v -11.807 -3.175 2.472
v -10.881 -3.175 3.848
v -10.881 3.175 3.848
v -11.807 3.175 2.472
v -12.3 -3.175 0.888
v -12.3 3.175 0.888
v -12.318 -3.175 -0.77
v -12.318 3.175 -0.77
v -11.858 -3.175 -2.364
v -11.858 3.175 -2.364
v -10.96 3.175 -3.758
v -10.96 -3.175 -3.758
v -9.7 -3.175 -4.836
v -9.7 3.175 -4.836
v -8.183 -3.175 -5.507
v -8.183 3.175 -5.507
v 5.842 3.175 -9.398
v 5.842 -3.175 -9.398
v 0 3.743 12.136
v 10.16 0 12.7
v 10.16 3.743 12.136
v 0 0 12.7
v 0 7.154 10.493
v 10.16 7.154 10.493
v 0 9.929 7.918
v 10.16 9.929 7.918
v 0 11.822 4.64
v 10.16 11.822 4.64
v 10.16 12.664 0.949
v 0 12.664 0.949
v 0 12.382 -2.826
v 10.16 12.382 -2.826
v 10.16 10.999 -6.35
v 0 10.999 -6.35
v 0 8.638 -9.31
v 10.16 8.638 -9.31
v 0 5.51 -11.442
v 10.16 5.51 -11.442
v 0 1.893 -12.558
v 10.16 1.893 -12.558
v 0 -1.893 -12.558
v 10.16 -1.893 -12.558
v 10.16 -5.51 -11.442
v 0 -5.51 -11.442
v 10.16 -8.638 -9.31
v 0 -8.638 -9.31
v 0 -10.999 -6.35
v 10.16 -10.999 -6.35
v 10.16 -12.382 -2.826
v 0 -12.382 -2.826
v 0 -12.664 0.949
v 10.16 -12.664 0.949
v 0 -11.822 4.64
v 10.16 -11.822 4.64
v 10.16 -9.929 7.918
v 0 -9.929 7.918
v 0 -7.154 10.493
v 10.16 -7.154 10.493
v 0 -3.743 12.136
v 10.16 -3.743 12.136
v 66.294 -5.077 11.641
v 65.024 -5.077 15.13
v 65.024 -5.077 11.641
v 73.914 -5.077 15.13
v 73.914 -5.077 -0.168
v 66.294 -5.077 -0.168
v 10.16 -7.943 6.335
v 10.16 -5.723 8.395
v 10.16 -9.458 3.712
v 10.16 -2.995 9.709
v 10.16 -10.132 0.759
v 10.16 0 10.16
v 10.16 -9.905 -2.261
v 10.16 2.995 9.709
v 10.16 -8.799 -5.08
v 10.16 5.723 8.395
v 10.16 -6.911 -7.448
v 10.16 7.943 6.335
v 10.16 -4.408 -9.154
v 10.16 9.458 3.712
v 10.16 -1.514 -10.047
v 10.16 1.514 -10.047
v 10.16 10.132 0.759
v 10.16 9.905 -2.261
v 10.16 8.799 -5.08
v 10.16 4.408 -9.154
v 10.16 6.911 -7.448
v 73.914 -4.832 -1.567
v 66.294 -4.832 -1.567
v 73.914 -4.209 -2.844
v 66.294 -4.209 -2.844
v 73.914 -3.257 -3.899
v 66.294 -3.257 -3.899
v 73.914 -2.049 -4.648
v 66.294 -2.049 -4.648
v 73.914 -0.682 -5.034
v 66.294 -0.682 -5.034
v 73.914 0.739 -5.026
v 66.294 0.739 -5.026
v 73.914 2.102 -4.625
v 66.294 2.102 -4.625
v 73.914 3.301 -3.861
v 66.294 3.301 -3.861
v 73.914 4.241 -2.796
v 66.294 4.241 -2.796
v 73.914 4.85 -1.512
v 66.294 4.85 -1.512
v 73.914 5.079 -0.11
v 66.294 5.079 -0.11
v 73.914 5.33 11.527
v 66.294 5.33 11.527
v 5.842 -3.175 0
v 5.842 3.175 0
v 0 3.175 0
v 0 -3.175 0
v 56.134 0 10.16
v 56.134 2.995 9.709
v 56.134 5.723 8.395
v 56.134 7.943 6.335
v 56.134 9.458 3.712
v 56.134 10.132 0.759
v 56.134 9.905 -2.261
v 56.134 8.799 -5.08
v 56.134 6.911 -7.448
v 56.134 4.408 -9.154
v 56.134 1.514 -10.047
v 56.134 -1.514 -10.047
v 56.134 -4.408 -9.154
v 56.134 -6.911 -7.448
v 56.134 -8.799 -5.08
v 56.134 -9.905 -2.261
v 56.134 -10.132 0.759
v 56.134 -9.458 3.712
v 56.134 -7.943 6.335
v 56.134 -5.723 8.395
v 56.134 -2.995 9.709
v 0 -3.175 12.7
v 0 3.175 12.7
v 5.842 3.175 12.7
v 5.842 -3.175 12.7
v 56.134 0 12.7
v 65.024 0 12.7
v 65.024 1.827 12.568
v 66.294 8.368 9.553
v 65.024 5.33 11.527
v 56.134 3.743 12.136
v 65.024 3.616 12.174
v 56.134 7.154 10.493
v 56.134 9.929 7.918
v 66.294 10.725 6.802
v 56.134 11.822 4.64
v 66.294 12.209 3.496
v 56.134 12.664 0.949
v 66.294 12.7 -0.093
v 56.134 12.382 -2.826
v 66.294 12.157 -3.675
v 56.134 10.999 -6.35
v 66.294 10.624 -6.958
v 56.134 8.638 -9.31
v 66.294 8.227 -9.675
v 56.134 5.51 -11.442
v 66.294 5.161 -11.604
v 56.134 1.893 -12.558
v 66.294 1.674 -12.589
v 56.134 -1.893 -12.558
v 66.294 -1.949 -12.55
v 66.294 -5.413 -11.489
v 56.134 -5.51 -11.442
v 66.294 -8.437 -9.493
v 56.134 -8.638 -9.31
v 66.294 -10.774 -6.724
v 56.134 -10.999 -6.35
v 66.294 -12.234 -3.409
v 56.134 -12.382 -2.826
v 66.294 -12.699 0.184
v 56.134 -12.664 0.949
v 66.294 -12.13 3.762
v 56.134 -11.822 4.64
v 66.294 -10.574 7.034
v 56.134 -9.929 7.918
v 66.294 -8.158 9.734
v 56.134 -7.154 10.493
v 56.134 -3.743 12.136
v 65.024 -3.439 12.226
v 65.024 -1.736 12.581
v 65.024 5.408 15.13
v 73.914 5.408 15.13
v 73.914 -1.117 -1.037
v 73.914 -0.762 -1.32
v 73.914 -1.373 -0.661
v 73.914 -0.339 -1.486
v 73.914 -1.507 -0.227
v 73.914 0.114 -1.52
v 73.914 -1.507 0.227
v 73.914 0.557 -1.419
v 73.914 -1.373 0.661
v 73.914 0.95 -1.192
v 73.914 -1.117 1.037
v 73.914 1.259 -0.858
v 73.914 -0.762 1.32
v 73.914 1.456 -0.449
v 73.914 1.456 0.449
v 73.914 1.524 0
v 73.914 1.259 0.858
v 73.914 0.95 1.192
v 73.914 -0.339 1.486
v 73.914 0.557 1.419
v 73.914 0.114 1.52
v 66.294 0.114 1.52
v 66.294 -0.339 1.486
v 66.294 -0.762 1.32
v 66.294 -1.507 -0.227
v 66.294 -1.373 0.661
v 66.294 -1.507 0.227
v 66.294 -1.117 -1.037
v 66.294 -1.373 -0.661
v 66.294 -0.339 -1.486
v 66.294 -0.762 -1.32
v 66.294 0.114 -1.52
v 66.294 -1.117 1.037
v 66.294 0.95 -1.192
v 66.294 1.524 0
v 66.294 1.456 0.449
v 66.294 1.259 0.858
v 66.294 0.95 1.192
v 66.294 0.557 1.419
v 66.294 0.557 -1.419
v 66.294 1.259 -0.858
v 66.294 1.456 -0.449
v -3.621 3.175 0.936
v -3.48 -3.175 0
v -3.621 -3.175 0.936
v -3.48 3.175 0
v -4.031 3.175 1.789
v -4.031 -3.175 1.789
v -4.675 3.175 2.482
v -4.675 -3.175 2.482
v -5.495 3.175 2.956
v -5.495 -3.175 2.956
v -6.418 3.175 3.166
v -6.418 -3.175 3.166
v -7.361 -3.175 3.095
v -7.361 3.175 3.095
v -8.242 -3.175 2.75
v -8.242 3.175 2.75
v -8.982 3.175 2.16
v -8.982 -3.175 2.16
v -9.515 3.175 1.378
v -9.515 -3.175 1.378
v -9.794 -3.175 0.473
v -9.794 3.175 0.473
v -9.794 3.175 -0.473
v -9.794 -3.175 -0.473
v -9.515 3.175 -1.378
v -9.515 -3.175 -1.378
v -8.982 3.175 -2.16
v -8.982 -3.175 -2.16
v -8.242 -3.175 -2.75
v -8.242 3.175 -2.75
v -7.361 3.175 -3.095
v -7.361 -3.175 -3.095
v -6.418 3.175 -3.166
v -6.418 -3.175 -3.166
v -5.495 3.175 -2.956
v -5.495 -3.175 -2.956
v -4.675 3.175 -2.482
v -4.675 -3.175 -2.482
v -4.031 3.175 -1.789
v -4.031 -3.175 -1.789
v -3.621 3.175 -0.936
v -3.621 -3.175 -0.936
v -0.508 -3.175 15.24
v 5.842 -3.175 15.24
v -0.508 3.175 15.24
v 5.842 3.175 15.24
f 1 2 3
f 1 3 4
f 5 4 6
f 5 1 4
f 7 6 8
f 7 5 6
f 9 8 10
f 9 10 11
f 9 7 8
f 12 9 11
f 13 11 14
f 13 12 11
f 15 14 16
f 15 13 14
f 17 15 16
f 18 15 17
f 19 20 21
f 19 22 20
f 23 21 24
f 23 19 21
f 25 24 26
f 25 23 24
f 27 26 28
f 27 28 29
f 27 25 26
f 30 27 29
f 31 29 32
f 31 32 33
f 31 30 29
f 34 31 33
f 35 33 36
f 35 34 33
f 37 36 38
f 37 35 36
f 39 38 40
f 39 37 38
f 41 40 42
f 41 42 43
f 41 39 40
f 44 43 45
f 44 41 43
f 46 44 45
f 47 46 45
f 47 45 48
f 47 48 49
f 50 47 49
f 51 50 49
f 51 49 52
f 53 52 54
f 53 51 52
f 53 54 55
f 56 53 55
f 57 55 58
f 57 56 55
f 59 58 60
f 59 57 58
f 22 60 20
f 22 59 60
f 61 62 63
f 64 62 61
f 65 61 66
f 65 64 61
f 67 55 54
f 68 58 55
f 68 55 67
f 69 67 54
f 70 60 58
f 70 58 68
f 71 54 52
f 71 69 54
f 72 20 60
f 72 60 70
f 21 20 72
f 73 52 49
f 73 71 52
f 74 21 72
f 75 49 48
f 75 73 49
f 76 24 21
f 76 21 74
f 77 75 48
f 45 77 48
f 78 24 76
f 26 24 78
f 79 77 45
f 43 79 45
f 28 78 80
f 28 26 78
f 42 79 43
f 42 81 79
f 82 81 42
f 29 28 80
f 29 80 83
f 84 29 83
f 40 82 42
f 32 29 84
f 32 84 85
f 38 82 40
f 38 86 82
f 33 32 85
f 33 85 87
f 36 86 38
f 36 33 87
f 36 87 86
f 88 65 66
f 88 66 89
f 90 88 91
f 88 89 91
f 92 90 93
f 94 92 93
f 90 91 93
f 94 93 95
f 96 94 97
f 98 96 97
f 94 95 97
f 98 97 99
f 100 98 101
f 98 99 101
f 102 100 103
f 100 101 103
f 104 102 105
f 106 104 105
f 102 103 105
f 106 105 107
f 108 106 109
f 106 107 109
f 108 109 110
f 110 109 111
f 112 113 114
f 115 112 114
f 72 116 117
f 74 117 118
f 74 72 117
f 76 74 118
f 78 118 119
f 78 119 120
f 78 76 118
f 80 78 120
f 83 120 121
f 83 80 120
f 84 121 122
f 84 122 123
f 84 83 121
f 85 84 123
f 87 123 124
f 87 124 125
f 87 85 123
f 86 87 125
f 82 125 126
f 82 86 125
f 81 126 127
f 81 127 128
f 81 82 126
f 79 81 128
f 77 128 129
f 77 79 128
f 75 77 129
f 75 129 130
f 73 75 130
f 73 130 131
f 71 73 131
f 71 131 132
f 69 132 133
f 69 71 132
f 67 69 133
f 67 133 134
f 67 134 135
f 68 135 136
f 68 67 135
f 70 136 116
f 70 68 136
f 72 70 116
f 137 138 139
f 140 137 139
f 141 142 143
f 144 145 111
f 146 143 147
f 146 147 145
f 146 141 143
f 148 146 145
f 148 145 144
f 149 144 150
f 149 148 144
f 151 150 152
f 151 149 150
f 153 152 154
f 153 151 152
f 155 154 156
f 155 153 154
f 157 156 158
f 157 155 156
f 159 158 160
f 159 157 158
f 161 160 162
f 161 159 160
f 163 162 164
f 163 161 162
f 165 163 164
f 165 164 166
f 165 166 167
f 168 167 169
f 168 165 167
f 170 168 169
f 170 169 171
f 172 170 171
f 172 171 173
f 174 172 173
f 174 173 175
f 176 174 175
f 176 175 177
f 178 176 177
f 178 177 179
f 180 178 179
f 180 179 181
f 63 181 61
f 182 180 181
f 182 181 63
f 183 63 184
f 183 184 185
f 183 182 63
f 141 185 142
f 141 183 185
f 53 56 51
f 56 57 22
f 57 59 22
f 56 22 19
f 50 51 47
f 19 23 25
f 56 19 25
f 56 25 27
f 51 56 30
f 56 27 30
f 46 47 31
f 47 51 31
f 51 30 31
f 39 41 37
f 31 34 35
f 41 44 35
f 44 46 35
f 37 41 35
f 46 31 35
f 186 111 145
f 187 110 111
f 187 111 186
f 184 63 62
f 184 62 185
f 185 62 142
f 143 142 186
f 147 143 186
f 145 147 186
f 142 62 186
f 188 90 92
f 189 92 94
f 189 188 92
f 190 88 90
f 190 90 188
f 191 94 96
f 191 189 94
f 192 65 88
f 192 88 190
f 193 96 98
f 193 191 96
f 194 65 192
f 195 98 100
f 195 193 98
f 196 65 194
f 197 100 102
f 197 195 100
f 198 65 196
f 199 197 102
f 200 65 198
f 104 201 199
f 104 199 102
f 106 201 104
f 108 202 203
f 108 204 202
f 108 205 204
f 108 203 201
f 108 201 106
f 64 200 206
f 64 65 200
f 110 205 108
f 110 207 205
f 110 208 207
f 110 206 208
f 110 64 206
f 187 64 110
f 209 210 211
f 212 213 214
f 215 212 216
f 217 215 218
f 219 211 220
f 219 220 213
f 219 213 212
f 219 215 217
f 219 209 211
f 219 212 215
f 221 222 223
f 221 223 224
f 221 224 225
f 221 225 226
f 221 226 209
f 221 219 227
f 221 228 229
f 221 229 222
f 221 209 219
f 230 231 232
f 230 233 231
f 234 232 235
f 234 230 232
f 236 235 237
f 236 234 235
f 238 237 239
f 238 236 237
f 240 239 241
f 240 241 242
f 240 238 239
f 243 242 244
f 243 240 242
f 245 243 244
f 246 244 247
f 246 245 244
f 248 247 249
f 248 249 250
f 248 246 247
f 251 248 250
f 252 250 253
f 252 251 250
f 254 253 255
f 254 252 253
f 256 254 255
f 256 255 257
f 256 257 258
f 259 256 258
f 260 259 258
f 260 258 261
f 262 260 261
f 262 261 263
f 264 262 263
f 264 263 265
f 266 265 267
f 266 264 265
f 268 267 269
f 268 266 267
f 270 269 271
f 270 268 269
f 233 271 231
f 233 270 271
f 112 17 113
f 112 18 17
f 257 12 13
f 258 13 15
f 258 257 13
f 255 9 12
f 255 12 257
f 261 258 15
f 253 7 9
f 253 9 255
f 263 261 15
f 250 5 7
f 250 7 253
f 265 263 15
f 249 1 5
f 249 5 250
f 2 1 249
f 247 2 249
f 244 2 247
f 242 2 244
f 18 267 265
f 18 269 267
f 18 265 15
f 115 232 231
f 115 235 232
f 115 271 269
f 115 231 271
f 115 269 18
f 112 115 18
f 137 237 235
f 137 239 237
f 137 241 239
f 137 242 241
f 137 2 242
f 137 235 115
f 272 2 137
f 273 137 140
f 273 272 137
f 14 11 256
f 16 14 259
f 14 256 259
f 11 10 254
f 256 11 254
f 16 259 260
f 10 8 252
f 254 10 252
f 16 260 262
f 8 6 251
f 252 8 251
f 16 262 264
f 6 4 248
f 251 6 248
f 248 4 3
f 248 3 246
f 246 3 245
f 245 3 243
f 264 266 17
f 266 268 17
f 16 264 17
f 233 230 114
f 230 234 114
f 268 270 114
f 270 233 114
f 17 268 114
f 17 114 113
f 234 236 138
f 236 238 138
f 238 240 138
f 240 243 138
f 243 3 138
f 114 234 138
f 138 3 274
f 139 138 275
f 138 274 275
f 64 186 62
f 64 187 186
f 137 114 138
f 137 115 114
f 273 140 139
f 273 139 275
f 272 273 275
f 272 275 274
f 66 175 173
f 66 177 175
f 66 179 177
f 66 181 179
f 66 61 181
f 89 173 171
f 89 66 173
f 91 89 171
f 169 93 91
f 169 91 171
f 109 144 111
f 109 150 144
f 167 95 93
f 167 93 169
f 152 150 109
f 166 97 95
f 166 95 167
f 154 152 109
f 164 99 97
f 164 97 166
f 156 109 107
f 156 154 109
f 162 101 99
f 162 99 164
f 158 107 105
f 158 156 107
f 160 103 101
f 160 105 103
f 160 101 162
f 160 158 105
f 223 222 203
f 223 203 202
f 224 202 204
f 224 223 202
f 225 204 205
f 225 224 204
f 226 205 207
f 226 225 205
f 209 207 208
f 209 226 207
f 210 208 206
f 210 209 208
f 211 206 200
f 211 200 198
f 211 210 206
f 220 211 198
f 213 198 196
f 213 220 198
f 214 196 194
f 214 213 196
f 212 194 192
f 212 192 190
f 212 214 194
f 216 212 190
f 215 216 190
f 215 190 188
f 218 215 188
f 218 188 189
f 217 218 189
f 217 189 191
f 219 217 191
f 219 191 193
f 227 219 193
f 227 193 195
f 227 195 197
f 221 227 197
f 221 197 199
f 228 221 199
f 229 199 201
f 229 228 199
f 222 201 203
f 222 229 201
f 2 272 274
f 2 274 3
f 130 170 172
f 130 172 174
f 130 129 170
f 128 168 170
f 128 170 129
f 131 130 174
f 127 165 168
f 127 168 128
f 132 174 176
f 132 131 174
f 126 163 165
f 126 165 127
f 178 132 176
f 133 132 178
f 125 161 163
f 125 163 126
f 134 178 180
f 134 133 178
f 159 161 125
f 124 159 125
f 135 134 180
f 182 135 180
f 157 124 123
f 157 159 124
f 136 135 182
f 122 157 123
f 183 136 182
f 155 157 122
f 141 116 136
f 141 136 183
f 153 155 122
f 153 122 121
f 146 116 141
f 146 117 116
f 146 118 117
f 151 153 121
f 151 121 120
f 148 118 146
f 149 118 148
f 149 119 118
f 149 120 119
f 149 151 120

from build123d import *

# Parameters (mm, degrees)
F0_W          = 5.842
F0_H          = 12.7
F0_R          = 3.175
F2_DEPTH      = 3.175
F3_R          = 1.524
F4_DEPTH      = 7.62
F4_DEPTH_BACK = 1.27


with BuildPart() as f1:
    # F0 (on Front) → F1 (revolve)
    with BuildSketch(Plane.XZ):
        with Locations((2.921, 6.35)):
            Rectangle(F0_W, F0_H)
        Polygon((5.842, 12.7), (5.842, 0), (66.294, 0), (66.294, 12.7), (56.134, 12.7), (56.134, 10.16), (10.16, 10.16), (10.16, 12.7), align=None)
    revolve(axis=Axis((33.147, 0, 0), (-1, 0, 0)))

    # F3 (on face) → F4 (join, two sides)
    with BuildSketch(Plane.YZ.offset(66.294)) as f4_sk:
        with BuildLine():
            Line((-5.0772309735, 0.1677070124), (-5.0772309735, -0.1677070124))
            ThreePointArc((-5.0772309735, -0.1677070124), (0.0289763613, -5.0799173586), (5.0788137641, -0.1097759081))
            ThreePointArc((5.0788137641, -0.1097759081), (5.0797034324, -0.0548911586), (5.08, 0))
            ThreePointArc((5.08, 0), (0.0838649353, 5.0793076962), (-5.0772309735, 0.1677070124))
        make_face()
        Circle(F3_R, mode=Mode.SUBTRACT)
        with BuildLine():
            ThreePointArc((5.08, 0), (5.0797034324, -0.0548911586), (5.0788137641, -0.1097759081))
            Line((5.0788137641, -0.1097759081), (5.3303419683, 11.5272483491))
            ThreePointArc((5.3303419683, 11.5272483491), (0.1387383567, 12.6992421691), (-5.0772309735, 11.6409503754))
            Line((-5.0772309735, 11.6409503754), (-5.0772309735, 0.1677070124))
            ThreePointArc((-5.0772309735, 0.1677070124), (0.0838649353, 5.0793076962), (5.08, 0))
        make_face()
        with BuildLine():
            ThreePointArc((-5.0772309735, 11.6409503754), (0.1387383567, 12.6992421691), (5.3303419683, 11.5272483491))
            Line((5.3303419683, 11.5272483491), (5.408218408, 15.1302240919))
            Line((5.408218408, 15.1302240919), (-5.0772309735, 15.1302240919))
            Line((-5.0772309735, 15.1302240919), (-5.0772309735, 11.6409503754))
        make_face()
    extrude(amount=F4_DEPTH)
    extrude(f4_sk.sketch, amount=-F4_DEPTH_BACK)


with BuildPart() as f2:
    # F0 (on Front) → F2 (new body, symmetric)
    with BuildSketch(Plane.XZ):
        with BuildLine():
            Line((-0.9398, 0), (0, 0))
            Line((0, 0), (0, 12.7))
            Line((0, 12.7), (5.842, 12.7))
            Line((5.842, 12.7), (5.842, 15.24))
            Line((5.842, 15.24), (-0.508, 15.24))
            Line((-0.508, 15.24), (-10.8806298187, 3.8475430269))
            ThreePointArc((-10.8806298187, 3.8475430269), (-4.5919612295, 5.3297205562), (-0.9398, 0))
        make_face()
        with BuildLine():
            ThreePointArc((-8.1826630726, -5.5069827884), (-3.1957909266, -4.5493385486), (-0.9398, 0))
            ThreePointArc((-0.9398, 0), (-4.5919612295, 5.3297205562), (-10.8806298187, 3.8475430269))
            ThreePointArc((-10.8806298187, 3.8475430269), (-12.1459778134, -1.5837270034), (-8.1826630726, -5.5069827884))
        make_face()
        with Locations((-6.6548, 0)):
            Circle(F0_R, mode=Mode.SUBTRACT)
        with BuildLine():
            Line((5.842, 0), (0, 0))
            Line((0, 0), (-0.9398, 0))
            ThreePointArc((-0.9398, 0), (-3.1957909266, -4.5493385486), (-8.1826630726, -5.5069827884))
            Line((-8.1826630726, -5.5069827884), (5.842, -9.398))
            Line((5.842, -9.398), (5.842, 0))
        make_face()
    extrude(amount=F2_DEPTH, both=True)


solid = Compound([f1.part, f2.part])
